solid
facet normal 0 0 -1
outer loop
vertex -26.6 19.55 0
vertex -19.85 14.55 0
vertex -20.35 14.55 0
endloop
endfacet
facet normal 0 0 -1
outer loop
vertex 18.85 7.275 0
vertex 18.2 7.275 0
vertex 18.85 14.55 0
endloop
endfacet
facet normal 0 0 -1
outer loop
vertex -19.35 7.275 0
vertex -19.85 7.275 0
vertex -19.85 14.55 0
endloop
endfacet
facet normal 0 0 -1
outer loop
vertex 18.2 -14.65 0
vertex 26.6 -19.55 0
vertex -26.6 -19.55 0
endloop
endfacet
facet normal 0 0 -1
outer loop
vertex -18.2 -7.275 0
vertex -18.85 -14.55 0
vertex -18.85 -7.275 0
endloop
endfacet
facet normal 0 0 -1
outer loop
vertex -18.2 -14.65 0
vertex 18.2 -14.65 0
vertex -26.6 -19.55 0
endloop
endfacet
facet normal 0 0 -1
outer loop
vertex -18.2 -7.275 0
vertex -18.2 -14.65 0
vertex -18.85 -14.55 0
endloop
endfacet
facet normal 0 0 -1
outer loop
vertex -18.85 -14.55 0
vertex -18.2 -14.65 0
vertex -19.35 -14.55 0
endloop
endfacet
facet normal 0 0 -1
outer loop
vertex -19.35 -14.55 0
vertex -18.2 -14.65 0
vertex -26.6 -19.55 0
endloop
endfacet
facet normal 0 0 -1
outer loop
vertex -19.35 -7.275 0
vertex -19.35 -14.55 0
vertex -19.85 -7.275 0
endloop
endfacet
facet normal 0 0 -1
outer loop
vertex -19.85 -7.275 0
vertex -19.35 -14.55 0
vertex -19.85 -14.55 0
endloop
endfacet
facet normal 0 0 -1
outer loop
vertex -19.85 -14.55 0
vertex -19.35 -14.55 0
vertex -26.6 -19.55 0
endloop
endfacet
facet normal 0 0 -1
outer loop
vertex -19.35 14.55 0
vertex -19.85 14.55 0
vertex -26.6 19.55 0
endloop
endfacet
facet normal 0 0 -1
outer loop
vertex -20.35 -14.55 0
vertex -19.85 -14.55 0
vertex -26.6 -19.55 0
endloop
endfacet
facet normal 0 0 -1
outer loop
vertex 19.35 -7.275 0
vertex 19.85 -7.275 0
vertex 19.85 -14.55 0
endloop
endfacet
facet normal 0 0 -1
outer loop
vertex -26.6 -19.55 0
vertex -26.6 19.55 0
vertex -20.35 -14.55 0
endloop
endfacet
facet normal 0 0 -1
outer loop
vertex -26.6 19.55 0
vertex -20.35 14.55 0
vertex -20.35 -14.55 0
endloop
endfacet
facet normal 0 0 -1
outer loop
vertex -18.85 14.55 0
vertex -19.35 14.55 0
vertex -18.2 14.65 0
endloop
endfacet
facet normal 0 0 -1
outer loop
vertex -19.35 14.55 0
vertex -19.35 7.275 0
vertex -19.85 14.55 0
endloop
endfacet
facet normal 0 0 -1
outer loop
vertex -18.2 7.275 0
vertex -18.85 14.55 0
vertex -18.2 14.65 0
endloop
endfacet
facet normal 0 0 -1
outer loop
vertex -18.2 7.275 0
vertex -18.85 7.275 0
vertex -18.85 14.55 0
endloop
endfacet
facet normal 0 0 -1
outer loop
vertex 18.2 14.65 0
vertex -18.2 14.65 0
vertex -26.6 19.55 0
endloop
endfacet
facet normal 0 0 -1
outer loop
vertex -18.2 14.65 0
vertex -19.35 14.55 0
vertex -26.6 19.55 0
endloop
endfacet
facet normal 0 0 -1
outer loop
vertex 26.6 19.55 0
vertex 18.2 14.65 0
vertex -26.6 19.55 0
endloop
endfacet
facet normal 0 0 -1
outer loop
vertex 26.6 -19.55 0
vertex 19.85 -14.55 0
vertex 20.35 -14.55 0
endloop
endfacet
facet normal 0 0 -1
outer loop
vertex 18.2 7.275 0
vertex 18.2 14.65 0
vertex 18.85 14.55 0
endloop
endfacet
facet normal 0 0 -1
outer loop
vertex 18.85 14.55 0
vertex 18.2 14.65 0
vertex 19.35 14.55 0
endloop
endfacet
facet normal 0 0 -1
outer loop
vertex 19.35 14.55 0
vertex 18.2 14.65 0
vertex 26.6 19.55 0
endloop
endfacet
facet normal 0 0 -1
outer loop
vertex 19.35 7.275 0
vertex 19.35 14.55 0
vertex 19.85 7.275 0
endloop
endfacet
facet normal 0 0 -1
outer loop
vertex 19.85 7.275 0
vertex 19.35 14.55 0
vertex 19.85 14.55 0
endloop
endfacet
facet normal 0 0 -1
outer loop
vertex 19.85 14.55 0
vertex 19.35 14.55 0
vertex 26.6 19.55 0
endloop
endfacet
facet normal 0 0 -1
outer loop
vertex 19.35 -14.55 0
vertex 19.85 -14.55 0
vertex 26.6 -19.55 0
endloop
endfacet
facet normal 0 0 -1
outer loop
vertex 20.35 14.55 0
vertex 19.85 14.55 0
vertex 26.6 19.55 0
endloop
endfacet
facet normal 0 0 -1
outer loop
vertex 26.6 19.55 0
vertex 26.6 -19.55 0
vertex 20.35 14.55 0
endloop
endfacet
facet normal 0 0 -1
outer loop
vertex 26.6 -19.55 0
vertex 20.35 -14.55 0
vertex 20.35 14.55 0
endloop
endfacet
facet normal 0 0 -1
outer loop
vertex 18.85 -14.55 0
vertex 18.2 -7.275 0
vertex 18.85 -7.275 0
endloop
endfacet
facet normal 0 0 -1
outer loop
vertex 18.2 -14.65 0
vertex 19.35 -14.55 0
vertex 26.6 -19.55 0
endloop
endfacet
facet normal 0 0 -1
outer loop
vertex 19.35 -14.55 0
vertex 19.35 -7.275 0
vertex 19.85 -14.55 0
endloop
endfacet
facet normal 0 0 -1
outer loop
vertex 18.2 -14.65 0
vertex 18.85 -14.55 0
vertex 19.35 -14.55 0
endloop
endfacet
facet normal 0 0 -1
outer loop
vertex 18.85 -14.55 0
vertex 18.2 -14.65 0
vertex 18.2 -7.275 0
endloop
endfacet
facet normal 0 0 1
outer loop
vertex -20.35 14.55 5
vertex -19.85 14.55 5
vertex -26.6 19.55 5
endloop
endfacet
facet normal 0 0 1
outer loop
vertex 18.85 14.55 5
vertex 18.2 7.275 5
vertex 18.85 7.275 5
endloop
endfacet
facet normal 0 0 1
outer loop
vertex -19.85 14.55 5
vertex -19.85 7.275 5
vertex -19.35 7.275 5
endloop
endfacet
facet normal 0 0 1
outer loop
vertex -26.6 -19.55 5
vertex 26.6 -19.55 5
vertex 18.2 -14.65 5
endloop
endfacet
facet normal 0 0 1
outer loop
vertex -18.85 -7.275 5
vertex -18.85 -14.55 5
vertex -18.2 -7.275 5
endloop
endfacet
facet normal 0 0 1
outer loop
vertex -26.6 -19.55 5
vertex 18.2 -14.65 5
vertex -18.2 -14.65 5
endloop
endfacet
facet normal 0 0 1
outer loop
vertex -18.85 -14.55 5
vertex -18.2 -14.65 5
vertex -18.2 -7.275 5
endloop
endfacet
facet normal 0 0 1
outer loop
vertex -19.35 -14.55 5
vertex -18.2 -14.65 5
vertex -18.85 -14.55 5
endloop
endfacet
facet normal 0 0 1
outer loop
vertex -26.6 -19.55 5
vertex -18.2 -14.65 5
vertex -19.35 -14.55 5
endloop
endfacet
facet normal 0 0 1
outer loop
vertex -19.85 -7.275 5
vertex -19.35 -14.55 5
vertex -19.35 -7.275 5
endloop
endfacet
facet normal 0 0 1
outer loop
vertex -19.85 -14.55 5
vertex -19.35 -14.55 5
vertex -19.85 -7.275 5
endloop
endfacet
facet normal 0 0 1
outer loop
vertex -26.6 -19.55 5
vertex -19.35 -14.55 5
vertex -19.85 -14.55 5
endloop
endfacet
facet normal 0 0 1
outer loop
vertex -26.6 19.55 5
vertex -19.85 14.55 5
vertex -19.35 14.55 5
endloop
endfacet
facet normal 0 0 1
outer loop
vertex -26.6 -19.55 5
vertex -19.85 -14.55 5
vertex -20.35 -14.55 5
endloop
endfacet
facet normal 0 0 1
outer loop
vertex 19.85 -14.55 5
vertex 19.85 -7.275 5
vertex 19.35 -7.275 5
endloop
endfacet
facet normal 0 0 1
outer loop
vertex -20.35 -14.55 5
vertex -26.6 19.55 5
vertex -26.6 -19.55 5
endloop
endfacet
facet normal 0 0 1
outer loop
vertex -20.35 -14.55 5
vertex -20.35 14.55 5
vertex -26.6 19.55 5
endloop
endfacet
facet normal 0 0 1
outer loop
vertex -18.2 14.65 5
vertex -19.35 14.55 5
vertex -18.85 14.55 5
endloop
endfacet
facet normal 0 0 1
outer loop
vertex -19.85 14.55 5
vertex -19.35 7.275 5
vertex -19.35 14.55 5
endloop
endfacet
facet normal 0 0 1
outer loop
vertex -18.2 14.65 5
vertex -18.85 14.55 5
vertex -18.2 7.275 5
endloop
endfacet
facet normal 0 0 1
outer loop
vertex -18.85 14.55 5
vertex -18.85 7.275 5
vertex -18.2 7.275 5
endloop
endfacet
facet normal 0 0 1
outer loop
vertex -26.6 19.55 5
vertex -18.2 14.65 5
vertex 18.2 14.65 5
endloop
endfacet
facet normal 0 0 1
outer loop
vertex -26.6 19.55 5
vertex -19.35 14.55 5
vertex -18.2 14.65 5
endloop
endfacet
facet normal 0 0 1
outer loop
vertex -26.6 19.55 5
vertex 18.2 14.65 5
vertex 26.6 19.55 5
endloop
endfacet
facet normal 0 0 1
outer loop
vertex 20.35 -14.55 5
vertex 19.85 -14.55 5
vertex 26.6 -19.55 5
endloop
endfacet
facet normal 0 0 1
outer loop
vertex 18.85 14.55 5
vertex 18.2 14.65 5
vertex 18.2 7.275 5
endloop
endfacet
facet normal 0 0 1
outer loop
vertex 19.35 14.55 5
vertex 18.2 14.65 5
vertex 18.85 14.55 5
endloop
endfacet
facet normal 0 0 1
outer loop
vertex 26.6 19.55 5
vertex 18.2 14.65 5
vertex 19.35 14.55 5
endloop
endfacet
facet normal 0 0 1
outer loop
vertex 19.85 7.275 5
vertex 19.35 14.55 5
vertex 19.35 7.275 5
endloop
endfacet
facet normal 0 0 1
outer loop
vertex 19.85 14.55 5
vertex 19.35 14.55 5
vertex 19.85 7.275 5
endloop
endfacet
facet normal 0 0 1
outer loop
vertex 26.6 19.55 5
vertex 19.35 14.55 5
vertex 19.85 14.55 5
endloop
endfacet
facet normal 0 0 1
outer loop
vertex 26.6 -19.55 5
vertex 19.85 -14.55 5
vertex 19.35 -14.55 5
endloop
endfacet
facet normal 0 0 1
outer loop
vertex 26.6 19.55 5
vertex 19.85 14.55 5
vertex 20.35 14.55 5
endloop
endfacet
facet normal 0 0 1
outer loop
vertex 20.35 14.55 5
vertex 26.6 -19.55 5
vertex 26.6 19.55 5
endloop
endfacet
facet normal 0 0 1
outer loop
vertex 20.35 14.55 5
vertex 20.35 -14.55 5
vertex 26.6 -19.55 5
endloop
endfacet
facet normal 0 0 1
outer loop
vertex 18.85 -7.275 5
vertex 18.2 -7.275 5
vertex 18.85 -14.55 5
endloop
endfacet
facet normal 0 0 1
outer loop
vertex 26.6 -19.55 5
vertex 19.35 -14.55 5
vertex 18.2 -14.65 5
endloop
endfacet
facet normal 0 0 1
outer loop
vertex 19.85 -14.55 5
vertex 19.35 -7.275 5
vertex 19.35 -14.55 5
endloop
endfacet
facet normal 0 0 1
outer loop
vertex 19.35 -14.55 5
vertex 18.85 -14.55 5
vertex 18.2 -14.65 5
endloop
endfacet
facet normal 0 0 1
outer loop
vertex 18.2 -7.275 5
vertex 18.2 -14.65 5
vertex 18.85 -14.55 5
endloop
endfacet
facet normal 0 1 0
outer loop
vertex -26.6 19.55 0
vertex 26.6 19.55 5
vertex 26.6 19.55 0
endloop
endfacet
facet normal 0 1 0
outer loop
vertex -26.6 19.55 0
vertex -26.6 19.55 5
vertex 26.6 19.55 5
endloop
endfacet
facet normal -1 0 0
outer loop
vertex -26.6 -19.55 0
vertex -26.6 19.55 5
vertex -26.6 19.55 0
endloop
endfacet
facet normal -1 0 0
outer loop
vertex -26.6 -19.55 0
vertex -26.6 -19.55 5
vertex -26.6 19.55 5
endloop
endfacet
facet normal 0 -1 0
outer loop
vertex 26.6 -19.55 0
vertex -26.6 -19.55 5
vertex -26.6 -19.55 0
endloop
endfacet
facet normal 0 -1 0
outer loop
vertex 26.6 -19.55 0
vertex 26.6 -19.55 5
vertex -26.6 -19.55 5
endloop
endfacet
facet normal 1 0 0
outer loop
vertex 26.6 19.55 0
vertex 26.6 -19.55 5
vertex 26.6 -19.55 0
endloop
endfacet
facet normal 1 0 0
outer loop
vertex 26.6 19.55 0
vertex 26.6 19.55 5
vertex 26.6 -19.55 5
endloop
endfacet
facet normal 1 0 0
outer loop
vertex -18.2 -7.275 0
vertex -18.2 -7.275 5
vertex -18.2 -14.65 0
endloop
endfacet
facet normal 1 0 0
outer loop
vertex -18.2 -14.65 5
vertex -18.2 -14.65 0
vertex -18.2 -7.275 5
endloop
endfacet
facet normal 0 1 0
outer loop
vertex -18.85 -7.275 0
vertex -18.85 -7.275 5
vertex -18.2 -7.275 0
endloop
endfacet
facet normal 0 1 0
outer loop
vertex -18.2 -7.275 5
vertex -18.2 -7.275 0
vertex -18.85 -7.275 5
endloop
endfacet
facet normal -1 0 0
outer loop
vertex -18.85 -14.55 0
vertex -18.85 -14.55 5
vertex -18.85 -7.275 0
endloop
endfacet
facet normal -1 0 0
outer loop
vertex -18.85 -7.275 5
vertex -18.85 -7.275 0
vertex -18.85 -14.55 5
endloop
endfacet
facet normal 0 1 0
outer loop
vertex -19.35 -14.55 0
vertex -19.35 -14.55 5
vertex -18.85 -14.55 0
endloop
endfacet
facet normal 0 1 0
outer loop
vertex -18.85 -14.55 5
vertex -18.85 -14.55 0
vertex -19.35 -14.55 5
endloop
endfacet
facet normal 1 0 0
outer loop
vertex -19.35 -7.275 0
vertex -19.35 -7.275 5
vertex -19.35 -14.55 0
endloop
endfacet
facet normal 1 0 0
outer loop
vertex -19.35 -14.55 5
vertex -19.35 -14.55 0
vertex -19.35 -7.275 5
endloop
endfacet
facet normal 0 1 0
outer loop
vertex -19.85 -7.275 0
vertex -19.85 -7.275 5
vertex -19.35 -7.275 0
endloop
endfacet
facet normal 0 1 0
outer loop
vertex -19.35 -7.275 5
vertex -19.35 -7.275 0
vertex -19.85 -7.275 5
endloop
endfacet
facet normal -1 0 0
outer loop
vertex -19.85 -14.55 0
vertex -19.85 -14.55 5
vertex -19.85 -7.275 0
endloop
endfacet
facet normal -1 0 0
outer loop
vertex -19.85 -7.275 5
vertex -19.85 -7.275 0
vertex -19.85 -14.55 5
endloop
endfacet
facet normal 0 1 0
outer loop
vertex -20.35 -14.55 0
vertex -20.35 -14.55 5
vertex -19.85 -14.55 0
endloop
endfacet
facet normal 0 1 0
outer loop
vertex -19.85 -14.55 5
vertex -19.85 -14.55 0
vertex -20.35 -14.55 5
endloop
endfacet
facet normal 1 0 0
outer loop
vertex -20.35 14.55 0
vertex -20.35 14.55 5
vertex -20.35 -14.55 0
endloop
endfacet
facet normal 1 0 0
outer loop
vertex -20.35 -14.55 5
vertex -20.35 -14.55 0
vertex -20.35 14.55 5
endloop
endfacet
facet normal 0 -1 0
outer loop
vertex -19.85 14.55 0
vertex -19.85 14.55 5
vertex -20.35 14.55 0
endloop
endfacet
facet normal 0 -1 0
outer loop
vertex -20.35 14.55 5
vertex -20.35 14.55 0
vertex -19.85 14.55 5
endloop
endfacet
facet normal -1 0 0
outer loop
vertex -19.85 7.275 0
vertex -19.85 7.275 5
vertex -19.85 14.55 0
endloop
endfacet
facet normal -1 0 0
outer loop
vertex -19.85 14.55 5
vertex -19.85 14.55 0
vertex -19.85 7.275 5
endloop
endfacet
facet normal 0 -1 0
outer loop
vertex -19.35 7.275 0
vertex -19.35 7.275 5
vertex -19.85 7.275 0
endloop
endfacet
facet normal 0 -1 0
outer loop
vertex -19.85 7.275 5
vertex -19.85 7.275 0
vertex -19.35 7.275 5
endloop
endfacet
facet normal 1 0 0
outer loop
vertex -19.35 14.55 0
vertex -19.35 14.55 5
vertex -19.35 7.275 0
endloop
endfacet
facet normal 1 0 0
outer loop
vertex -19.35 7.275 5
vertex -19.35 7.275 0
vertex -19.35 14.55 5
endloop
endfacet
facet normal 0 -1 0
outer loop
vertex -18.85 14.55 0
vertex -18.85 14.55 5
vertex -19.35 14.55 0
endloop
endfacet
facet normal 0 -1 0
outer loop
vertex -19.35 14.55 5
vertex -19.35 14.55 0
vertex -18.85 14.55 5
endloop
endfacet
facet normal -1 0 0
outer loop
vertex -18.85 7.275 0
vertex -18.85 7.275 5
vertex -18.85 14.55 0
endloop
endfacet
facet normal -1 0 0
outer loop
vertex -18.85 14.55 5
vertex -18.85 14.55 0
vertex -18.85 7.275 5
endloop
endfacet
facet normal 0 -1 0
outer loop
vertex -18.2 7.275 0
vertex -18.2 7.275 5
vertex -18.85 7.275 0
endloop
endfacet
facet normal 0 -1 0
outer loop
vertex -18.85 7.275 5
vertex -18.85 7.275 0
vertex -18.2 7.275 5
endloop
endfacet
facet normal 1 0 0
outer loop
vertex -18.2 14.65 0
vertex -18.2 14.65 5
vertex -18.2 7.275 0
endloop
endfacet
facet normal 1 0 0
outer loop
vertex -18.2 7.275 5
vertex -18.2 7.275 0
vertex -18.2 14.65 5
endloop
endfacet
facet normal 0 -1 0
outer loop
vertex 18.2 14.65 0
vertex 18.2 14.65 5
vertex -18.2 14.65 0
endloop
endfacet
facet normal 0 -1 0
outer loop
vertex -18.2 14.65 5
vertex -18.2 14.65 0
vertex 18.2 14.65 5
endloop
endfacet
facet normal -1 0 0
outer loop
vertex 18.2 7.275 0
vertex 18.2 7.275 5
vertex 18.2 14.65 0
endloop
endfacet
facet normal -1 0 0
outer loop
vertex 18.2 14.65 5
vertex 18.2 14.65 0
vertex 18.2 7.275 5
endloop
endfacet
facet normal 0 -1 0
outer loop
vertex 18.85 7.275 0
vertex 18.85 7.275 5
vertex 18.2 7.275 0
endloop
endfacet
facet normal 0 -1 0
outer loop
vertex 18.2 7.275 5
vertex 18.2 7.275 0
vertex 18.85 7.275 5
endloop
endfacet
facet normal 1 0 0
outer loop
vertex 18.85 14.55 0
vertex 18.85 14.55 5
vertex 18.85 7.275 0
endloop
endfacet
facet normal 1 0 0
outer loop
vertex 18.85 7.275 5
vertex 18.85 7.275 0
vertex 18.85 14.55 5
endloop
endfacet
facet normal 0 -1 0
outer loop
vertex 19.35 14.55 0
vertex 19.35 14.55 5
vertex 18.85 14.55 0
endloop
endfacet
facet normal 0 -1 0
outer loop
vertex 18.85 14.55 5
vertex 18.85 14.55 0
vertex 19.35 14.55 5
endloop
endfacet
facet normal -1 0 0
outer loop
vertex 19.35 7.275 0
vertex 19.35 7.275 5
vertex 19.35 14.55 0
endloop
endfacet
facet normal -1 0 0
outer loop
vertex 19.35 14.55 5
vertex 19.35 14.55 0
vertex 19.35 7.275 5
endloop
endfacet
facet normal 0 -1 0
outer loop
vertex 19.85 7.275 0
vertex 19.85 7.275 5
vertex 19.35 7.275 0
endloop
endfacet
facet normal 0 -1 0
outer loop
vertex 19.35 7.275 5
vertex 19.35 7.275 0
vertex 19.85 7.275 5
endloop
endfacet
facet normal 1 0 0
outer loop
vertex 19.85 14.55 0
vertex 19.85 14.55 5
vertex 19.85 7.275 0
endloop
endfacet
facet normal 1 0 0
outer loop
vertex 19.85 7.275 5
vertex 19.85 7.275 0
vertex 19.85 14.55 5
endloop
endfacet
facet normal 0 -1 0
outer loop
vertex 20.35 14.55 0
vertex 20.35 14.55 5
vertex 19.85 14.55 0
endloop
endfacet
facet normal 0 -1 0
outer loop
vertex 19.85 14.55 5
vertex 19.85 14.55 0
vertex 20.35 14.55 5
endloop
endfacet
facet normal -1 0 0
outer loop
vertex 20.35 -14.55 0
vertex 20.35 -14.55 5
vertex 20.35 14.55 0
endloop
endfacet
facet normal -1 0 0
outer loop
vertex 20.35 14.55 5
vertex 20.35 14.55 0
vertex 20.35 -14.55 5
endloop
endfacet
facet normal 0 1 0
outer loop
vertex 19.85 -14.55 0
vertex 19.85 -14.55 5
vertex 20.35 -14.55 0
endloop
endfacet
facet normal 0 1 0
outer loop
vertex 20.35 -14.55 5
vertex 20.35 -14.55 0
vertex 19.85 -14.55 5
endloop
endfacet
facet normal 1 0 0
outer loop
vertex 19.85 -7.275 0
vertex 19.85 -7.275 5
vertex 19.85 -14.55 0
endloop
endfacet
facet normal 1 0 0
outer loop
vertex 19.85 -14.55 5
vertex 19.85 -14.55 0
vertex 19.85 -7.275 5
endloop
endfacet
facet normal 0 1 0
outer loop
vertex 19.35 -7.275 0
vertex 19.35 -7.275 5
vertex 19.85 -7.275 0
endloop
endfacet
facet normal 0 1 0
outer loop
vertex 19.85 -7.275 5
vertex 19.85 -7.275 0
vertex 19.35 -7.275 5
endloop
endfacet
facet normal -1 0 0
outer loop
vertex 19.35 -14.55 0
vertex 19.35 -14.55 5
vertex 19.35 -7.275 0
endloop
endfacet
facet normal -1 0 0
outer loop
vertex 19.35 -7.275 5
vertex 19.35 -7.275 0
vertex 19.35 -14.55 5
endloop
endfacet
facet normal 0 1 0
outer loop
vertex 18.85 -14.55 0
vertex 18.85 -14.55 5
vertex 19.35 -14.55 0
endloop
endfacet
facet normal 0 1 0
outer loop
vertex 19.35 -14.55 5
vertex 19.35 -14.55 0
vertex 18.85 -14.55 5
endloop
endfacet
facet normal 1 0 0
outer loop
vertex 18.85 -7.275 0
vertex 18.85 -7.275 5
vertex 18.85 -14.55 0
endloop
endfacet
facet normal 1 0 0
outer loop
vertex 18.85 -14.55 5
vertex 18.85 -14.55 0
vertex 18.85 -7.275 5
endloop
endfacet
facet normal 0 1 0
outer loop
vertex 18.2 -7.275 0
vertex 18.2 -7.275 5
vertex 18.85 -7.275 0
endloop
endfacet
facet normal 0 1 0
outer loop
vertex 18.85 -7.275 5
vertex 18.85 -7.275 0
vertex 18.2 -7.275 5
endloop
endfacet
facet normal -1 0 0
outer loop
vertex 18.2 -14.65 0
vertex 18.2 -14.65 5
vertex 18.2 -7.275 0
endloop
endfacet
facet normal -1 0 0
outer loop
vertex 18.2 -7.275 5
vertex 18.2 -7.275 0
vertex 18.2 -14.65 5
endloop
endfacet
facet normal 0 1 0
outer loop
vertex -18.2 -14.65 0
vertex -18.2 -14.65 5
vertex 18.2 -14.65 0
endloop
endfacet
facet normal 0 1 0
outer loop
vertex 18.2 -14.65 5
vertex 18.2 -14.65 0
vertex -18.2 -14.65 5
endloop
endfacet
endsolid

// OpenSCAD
thick = 5;
w = 38.2;
h = 29.1;
tolerance = 0.1;
finger = 0.5;

linear_extrude(height = thick) 
difference() {
    square(size = [w + 3 * thick, h + 2 * thick], center = true);
    square(size = [w + (2 * tolerance) - (4 * finger), h + (2 * tolerance)], center = true);
    square(size = [w + (2 * tolerance) + (4 * finger), h / 2], center = true);
    translate(v = [w/2,0,0]) square(size = [finger, h], center = true);
    translate(v = [-w/2,0,0]) square(size = [finger, h], center = true);
    translate(v = [w/2+2*finger,0,0]) square(size = [finger, h], center = true);
    translate(v = [-(w/2+2*finger),0,0]) square(size = [finger, h], center = true);
}
